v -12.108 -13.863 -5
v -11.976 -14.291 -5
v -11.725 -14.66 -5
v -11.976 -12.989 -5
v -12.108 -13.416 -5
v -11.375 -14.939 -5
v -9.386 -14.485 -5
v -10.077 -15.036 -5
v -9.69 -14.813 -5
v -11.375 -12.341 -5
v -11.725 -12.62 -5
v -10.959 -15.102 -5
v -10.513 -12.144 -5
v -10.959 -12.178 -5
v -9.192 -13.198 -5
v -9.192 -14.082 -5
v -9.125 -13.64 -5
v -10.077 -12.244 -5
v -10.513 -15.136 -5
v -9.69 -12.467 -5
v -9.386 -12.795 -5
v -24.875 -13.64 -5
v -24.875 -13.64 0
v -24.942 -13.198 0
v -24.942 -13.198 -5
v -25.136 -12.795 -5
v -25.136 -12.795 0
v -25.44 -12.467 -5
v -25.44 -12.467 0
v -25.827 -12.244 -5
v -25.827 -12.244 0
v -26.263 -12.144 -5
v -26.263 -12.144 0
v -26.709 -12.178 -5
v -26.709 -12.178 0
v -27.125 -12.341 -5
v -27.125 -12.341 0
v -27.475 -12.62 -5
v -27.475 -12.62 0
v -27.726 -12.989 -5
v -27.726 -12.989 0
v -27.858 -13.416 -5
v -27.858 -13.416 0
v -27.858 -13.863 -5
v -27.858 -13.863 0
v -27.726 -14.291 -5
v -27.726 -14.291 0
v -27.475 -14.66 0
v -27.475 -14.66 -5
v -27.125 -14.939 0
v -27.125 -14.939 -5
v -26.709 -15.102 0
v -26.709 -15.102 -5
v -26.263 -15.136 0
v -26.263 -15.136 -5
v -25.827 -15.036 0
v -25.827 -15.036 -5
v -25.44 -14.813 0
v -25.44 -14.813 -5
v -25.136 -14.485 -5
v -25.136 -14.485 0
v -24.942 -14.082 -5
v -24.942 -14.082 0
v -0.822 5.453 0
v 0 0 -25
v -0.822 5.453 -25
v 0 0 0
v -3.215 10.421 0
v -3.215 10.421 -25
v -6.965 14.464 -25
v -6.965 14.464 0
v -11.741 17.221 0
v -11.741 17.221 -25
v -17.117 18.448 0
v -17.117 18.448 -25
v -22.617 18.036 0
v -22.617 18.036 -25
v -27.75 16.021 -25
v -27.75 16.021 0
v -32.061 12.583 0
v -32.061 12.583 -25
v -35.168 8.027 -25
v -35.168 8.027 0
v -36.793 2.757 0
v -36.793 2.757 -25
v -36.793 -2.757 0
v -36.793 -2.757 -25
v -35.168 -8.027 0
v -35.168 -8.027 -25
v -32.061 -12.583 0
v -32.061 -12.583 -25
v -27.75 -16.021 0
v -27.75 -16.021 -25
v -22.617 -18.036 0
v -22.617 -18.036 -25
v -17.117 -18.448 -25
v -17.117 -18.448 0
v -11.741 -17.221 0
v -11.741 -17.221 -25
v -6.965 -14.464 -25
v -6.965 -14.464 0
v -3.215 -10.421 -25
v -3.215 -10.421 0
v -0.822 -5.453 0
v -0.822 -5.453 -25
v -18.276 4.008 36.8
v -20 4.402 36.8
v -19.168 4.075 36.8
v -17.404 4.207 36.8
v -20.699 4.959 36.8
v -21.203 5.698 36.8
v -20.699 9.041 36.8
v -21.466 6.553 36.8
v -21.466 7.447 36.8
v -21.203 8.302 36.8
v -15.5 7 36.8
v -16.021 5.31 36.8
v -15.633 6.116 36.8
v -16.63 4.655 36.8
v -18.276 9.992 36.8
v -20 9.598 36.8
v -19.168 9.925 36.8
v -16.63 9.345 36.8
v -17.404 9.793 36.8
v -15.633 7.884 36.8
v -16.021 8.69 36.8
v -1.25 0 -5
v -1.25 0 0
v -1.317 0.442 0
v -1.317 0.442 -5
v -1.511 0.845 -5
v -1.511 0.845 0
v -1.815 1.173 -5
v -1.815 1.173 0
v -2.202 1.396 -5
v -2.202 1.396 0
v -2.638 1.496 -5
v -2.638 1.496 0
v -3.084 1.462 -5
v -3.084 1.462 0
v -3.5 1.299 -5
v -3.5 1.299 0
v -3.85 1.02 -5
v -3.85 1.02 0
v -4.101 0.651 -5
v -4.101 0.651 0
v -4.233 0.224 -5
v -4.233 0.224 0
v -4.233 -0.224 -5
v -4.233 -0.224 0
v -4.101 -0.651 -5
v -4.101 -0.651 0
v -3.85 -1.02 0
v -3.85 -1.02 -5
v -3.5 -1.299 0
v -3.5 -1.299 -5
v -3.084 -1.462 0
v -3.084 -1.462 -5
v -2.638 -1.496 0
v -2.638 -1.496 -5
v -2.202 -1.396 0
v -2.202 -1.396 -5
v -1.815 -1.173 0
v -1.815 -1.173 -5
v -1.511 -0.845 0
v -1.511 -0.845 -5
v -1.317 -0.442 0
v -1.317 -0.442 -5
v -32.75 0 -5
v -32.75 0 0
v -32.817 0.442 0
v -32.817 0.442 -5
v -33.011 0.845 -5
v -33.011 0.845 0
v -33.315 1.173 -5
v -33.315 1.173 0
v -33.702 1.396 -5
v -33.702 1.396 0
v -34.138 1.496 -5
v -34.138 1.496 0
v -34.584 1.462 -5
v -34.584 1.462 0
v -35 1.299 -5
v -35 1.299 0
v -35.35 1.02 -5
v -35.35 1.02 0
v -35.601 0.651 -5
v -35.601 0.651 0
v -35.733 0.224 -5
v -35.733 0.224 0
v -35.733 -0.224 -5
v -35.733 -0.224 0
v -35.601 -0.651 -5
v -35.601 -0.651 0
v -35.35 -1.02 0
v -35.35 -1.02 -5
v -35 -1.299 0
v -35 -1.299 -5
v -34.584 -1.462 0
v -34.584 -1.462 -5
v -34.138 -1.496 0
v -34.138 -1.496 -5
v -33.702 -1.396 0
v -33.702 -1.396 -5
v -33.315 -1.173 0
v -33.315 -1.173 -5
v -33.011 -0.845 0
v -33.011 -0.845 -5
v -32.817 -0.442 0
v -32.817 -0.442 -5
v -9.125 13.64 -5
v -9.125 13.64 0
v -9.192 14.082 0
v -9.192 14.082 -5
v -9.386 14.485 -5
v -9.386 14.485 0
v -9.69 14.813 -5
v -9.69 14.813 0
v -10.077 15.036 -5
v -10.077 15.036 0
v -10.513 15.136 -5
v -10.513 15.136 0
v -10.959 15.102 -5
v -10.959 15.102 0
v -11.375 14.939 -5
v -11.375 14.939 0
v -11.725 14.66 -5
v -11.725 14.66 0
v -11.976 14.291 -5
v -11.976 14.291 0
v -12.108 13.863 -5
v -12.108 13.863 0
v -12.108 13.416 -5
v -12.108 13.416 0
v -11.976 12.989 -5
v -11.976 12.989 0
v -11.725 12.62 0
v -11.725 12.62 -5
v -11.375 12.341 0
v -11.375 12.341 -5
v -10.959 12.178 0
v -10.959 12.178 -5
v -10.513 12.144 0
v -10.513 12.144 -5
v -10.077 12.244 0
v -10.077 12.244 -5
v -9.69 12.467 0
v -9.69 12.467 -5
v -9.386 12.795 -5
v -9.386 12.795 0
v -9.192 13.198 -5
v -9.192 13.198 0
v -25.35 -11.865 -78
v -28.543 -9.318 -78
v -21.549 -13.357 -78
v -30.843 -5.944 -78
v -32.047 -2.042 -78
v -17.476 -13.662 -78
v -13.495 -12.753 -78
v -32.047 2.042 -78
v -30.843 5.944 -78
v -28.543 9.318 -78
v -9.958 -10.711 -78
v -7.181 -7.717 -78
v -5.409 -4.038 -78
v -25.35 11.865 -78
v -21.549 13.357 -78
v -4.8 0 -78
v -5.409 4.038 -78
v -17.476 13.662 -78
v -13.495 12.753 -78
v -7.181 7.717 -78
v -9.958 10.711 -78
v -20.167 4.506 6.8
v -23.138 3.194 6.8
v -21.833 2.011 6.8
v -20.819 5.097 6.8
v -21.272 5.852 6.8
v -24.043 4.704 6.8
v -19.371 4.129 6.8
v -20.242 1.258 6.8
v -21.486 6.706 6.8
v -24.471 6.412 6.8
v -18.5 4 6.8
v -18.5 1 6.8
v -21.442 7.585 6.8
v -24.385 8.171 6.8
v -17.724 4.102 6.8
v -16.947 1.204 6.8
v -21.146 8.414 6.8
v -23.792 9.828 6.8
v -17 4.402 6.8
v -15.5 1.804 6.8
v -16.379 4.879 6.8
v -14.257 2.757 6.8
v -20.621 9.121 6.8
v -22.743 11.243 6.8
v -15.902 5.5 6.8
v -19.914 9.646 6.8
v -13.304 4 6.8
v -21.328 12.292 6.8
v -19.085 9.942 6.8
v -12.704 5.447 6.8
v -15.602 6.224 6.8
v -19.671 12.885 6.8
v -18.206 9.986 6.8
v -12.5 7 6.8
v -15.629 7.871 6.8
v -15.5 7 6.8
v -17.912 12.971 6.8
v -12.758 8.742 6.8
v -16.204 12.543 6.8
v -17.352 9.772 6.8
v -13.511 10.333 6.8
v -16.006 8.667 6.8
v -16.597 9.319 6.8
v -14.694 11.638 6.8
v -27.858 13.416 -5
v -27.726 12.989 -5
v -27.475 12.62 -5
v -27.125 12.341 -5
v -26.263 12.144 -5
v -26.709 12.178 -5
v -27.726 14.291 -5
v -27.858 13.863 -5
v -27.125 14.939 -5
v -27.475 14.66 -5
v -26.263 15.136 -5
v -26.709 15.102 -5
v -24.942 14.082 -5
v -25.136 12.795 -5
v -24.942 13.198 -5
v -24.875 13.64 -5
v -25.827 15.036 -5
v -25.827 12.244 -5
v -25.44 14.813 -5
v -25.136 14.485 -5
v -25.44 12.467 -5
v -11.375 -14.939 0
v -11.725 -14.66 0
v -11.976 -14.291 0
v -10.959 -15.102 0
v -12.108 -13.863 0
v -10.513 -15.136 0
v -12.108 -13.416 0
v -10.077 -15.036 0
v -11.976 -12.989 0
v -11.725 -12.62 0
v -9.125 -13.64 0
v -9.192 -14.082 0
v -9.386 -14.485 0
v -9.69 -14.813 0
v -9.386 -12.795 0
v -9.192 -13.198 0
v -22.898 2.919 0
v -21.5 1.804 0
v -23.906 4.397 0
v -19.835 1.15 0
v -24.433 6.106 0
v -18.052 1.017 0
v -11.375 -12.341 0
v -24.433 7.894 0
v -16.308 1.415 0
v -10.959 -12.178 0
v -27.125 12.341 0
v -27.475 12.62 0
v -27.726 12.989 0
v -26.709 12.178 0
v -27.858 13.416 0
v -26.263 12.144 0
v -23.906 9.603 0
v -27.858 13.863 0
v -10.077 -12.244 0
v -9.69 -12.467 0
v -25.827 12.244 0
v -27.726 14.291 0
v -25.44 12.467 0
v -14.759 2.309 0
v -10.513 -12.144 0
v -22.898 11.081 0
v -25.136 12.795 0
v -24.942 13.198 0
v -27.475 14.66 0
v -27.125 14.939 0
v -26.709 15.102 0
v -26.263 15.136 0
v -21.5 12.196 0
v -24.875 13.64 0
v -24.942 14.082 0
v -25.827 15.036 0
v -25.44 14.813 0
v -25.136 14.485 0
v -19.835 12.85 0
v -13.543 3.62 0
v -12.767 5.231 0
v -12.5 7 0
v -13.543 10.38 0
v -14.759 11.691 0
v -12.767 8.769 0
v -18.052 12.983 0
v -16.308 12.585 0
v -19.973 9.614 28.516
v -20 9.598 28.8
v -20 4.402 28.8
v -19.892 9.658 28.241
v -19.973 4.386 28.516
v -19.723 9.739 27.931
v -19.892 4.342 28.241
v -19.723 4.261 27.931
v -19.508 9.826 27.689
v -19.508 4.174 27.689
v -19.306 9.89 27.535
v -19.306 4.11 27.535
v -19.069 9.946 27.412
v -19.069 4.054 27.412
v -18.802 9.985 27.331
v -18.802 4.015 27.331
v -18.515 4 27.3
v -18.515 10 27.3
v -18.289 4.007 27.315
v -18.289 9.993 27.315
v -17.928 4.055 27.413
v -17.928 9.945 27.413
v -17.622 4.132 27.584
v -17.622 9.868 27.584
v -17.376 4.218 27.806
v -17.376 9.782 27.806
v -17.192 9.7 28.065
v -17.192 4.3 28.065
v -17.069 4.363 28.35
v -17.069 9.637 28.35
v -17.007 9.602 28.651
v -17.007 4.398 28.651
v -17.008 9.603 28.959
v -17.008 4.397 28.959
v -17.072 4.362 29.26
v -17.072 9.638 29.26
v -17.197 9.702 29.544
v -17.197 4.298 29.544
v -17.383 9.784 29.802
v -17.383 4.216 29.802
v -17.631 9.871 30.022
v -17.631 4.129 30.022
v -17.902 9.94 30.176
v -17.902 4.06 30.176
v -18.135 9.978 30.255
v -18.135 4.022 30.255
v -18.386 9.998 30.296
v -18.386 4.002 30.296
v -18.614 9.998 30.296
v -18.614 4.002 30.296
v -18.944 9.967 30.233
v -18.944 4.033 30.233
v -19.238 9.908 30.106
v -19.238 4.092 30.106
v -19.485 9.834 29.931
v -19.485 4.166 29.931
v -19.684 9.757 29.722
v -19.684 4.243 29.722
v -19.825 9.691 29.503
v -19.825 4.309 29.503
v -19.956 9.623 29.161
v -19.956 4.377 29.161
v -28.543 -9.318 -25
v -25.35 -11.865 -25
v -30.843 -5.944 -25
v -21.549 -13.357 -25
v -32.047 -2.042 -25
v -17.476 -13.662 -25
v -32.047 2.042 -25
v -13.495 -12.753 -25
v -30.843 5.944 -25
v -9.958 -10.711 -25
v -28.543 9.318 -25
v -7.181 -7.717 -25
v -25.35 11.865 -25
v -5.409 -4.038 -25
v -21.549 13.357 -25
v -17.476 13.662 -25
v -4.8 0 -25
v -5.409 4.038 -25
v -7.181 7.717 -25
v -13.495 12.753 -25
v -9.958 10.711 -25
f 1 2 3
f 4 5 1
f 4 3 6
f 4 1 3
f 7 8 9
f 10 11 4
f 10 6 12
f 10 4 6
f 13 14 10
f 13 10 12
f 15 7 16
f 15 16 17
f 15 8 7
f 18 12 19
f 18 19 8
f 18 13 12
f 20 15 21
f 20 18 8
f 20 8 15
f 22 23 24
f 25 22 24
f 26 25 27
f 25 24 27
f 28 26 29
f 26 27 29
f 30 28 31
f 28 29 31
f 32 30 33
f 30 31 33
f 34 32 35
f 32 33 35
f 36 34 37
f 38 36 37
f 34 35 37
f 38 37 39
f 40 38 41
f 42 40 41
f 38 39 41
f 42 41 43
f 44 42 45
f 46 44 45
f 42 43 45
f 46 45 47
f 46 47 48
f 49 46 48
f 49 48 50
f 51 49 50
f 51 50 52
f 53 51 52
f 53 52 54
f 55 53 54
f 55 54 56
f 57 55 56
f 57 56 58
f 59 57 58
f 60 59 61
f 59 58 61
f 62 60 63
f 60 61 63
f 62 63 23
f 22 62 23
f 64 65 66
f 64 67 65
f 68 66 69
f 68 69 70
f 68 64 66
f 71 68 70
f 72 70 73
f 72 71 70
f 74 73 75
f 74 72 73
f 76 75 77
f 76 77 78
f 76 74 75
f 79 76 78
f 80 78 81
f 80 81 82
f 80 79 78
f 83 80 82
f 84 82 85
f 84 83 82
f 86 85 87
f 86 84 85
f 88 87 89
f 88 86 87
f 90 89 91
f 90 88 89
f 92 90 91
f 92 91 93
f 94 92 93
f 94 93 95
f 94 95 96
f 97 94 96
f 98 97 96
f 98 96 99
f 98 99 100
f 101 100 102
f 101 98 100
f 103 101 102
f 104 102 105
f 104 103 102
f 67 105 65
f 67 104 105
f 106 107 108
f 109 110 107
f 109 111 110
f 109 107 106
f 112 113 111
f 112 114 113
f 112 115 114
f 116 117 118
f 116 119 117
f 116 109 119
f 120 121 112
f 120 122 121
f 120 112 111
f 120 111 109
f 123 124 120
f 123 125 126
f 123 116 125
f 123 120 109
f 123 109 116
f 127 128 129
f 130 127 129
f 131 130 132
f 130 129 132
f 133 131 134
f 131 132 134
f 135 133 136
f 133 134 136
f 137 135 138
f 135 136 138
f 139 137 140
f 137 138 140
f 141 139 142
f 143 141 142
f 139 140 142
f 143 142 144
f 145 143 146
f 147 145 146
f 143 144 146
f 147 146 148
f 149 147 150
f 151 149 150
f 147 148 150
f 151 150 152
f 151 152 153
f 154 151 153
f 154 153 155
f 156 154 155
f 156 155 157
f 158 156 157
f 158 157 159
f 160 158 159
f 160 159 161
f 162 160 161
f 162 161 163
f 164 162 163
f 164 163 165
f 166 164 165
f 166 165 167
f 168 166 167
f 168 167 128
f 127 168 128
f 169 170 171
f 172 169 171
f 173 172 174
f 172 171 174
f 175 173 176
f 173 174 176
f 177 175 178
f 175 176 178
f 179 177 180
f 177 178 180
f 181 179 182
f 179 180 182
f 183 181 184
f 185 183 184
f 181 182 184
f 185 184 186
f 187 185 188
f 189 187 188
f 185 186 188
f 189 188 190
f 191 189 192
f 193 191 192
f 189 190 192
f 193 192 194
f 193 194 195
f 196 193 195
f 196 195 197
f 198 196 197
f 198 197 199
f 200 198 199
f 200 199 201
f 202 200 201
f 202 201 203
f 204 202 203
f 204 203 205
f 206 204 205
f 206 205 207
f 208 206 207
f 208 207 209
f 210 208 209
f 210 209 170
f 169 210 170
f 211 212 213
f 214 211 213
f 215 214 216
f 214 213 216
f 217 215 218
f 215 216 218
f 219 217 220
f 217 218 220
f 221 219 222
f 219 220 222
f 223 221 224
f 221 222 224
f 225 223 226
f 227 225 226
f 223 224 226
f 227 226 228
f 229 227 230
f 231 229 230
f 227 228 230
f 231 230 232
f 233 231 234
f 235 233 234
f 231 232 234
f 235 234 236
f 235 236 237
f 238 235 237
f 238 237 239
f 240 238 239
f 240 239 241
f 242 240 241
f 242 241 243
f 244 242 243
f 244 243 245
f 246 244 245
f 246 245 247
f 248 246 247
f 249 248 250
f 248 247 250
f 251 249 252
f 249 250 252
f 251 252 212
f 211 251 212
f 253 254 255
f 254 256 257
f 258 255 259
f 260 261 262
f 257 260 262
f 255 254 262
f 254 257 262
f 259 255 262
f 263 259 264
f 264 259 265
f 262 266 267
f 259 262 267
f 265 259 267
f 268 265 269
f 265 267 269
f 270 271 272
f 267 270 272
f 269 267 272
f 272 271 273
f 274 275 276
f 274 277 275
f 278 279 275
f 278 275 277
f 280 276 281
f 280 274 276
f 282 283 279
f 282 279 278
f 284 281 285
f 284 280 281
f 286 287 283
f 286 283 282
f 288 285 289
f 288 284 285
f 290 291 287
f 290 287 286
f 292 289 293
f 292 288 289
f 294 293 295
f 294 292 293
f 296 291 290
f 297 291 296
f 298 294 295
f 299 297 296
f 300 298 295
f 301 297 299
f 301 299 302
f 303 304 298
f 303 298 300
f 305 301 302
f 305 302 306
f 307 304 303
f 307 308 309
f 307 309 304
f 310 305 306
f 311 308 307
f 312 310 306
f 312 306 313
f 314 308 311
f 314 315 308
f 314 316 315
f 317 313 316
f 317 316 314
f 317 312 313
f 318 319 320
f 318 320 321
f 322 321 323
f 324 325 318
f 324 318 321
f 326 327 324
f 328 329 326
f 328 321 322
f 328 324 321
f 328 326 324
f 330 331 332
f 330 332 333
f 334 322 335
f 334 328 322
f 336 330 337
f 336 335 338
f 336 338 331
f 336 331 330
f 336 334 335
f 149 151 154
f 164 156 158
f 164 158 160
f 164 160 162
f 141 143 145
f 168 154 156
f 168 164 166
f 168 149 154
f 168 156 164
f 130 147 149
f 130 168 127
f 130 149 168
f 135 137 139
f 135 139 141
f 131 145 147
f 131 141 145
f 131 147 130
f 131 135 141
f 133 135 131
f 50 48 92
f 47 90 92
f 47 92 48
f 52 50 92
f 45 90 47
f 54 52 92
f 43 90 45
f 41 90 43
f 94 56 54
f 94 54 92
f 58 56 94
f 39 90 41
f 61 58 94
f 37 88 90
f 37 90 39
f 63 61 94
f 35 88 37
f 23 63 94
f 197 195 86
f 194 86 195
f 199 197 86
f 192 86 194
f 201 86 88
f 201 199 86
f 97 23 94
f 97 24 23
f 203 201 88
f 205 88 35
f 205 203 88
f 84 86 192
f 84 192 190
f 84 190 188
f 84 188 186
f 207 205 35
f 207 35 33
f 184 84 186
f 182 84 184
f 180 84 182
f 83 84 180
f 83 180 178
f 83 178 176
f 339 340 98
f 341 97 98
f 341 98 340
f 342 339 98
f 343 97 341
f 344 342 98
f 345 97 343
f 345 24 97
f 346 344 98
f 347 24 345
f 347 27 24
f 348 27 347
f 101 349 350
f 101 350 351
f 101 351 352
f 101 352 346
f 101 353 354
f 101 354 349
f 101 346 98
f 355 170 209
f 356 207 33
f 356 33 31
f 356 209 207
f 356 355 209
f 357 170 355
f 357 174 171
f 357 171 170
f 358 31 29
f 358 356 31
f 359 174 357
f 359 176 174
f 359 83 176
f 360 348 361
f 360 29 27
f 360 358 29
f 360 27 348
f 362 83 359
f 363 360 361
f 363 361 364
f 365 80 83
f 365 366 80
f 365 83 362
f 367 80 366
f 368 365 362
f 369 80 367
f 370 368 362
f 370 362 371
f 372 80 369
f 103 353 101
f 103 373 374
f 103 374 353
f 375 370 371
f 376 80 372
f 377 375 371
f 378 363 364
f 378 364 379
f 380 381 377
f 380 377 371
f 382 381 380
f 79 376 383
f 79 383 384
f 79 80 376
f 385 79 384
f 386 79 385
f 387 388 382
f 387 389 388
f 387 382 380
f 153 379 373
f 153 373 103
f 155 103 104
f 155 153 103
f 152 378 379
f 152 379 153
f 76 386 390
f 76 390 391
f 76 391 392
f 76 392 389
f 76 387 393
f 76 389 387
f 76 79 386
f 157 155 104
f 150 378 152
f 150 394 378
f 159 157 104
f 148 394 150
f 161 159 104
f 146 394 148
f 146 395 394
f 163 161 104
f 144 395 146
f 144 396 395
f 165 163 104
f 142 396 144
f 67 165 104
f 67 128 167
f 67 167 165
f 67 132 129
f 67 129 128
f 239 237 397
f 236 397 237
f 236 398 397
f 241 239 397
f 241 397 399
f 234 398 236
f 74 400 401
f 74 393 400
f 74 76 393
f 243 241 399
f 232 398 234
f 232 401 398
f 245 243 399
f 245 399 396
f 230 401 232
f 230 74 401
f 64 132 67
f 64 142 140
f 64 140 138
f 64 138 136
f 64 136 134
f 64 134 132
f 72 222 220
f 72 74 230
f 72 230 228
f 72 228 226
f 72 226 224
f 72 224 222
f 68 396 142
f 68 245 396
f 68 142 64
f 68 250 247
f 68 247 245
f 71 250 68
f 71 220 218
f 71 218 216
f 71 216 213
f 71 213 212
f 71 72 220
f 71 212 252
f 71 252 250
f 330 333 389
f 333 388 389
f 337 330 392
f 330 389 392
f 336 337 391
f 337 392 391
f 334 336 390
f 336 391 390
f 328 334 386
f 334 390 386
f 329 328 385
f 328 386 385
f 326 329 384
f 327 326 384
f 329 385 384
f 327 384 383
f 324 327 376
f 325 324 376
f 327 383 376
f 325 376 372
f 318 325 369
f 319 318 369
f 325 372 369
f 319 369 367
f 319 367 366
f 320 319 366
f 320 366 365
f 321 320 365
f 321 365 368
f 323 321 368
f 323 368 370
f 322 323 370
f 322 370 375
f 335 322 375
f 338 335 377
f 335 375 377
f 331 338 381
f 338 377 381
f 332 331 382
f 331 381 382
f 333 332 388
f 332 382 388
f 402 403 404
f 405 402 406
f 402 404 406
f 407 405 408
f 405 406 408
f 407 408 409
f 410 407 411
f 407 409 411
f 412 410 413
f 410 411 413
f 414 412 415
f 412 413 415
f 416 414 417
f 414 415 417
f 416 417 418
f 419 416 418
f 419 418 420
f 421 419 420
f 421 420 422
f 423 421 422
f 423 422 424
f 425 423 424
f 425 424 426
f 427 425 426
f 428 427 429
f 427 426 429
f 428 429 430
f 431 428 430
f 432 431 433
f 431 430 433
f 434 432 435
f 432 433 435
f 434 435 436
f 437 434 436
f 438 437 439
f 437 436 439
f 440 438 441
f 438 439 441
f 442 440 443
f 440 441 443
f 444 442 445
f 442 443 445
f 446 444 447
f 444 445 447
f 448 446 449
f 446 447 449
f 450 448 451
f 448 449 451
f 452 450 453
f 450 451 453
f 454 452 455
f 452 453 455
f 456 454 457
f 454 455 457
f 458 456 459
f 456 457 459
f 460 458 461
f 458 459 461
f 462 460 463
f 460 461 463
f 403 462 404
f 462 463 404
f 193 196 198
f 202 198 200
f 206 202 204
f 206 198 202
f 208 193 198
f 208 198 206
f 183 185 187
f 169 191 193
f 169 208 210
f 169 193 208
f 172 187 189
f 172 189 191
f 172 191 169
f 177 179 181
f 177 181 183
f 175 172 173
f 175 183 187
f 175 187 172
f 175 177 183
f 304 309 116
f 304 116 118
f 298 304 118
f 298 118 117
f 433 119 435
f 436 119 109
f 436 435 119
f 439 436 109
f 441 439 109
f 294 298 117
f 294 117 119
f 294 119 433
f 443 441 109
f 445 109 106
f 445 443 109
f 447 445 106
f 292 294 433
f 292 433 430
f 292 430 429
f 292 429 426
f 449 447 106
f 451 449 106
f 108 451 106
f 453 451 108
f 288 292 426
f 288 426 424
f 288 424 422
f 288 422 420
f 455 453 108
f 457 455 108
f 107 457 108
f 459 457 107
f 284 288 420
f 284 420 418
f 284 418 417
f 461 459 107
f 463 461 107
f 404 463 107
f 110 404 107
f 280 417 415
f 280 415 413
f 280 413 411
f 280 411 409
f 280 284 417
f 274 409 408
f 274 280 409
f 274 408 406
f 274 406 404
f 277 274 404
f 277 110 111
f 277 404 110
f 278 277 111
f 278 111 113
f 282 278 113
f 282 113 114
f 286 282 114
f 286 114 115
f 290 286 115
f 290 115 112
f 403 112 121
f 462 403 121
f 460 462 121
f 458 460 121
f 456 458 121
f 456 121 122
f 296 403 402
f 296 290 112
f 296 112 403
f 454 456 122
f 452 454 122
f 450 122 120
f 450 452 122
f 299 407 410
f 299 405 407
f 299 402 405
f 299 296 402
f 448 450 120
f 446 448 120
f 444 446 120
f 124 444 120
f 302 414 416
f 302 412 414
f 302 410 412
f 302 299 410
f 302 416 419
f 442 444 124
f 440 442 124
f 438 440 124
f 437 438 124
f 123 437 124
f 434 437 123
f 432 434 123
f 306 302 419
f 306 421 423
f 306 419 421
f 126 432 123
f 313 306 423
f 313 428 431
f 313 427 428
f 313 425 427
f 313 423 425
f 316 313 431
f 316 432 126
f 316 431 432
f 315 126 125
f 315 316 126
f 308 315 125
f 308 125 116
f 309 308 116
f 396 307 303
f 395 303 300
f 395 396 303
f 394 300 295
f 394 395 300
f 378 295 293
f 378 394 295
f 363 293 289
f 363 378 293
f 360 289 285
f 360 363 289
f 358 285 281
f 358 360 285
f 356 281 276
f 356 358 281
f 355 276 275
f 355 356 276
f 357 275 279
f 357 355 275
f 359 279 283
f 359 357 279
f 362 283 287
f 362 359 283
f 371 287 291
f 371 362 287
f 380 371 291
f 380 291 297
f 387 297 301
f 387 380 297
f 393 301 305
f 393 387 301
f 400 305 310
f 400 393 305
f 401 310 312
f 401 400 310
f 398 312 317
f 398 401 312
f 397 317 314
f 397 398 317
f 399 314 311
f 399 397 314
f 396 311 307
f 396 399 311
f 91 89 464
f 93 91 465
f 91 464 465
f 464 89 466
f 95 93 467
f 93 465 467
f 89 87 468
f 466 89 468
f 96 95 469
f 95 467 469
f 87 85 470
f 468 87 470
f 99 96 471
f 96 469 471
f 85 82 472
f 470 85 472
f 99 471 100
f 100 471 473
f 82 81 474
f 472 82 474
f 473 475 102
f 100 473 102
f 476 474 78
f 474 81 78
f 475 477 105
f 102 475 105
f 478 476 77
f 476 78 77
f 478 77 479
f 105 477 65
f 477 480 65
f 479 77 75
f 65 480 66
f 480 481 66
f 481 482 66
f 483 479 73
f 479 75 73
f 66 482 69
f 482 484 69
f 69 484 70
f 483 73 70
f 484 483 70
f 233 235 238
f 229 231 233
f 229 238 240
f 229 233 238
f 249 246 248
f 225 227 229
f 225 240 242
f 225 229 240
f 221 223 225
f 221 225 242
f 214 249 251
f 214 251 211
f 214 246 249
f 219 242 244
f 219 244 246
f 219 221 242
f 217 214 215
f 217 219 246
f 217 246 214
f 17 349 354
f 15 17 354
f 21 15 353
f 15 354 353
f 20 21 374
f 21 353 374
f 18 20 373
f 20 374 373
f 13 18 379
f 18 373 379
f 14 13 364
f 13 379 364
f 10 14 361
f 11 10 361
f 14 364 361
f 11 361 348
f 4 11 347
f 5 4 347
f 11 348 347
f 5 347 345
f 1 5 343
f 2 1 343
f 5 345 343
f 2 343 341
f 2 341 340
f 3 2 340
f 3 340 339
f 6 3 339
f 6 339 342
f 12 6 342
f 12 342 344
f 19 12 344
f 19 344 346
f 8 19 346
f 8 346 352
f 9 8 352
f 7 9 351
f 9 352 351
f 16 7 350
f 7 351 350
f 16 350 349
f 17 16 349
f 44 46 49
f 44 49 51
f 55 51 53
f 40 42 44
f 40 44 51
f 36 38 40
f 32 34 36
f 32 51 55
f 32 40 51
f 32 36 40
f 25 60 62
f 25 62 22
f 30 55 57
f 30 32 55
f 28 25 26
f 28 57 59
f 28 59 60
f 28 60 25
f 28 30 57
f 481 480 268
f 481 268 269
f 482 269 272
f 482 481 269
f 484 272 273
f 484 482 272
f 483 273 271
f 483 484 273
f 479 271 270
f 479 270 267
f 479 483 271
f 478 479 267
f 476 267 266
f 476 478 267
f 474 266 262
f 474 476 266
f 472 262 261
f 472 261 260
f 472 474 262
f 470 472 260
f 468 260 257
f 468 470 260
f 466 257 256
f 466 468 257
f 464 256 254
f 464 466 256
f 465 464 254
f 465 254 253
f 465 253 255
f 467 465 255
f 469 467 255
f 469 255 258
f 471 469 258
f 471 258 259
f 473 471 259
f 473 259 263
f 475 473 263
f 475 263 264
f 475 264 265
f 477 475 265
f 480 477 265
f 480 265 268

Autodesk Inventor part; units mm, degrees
ref_plane "YZ Plane" through (0, 0, 0) normal (1, 0, 0) x (0, 1, 0)
ref_plane "XZ Plane" through (0, 0, 0) normal (0, 1, 0) x (-1, 0, 0)
ref_plane "XY Plane" through (0, 0, 0) normal (0, 0, 1) x (1, 0, 0)
sketch "Sketch1" plane through (0, 0, 0) normal (0, 1, 0) x (-1, 0, 0)
  line L0 (0, 0) -> (18.5, 0)
  line L1 (37, 0) -> (37, -25)
  line L2 (0, -25) -> (0, 0)
  line L3 (18.5, -25) -> (18.5, -78)
  line L4 (32.2, -78) -> (32.2, -25)
  line L5 (4.8, -78) -> (4.8, -25)
  line L6 (32.2, -78) -> (4.8, -78)
  line L7 (18.5, -78) -> (18.5, 0)
  line L8 (37, -25) -> (32.2, -25)
  line L9 (18.5, -25) -> (0, -25)
  line L10 (18.5, -25) -> (4.8, -25)
  line L11 (18.5, -78) -> (4.8, -78)
  line L12 (18.5, 0) -> (25.5, 0)
  line L13 (18.5, 0) -> (18.5, 36.8)
  line L14 (18.5, 36.8) -> (18.5, 28.8)
  circle A0 centre (18.5, 28.8) radius 1.5
  dimension "d1" = 25
  dimension "d2" = 53
  dimension "d30" = 36.8
  dimension "d31" = 8
  dimension "d32" = 3
revolve "Revolution1" add sketch "Sketch1" angle 360 about axis through (-18.5, 0, -78) along (0, 0, 1) contours L0 L7 L9 L2 | L3 L6 L5 L9
sketch "Sketch2" plane through (-18.5, 0, 0) normal (0, 0, 1) x (1, 0, 0)
  circle A0 centre (0, 0) radius 15.75
  circle A1 centre (-15.75, 0) radius 1.5
  circle A2 centre (15.75, 0) radius 1.5
  line L0 (0, 0) -> (0, 7)
  circle A3 centre (0, 7) radius 6
  circle A4 centre (0, 7) radius 3
  circle A5 centre (-7.875, 13.6399) radius 1.5
  circle A6 centre (7.875, 13.6399) radius 1.5
  circle A7 centre (-7.875, -13.6399) radius 1.5
  circle A8 centre (7.875, -13.6399) radius 1.5
  point P0 (18.5, 0)
  dimension "d12" = 3
  dimension "d13" = 3
  dimension "d14" = 7
  dimension "d15" = 12
  dimension "d16" = 6
  dimension "d17" = 3
  dimension "d18" = 3
  dimension "d19" = 3
  dimension "d20" = 3
extrude "Extrusion3" add sketch "Sketch2" along normal blind 6.8 contours A3
extrude "Extrusion4" add sketch "Sketch2" along normal blind 36.8 contours A4
extrude "Extrusion5" cut sketch "Sketch2" against normal blind 5 contours A0 A2 | A0 A2 | A6 A0 | A0 A6 | A8 A0 | A0 A8 | A5 A0 | A0 A5 | A7 A0 | A0 A7 | A1 A0 | A0 A1
extrude "Extrusion6" cut sketch "Sketch1" along normal blind 20 contours A0 L13 | L13 A0
properties part number "offcentered_shaft_dc_and_encoder"
